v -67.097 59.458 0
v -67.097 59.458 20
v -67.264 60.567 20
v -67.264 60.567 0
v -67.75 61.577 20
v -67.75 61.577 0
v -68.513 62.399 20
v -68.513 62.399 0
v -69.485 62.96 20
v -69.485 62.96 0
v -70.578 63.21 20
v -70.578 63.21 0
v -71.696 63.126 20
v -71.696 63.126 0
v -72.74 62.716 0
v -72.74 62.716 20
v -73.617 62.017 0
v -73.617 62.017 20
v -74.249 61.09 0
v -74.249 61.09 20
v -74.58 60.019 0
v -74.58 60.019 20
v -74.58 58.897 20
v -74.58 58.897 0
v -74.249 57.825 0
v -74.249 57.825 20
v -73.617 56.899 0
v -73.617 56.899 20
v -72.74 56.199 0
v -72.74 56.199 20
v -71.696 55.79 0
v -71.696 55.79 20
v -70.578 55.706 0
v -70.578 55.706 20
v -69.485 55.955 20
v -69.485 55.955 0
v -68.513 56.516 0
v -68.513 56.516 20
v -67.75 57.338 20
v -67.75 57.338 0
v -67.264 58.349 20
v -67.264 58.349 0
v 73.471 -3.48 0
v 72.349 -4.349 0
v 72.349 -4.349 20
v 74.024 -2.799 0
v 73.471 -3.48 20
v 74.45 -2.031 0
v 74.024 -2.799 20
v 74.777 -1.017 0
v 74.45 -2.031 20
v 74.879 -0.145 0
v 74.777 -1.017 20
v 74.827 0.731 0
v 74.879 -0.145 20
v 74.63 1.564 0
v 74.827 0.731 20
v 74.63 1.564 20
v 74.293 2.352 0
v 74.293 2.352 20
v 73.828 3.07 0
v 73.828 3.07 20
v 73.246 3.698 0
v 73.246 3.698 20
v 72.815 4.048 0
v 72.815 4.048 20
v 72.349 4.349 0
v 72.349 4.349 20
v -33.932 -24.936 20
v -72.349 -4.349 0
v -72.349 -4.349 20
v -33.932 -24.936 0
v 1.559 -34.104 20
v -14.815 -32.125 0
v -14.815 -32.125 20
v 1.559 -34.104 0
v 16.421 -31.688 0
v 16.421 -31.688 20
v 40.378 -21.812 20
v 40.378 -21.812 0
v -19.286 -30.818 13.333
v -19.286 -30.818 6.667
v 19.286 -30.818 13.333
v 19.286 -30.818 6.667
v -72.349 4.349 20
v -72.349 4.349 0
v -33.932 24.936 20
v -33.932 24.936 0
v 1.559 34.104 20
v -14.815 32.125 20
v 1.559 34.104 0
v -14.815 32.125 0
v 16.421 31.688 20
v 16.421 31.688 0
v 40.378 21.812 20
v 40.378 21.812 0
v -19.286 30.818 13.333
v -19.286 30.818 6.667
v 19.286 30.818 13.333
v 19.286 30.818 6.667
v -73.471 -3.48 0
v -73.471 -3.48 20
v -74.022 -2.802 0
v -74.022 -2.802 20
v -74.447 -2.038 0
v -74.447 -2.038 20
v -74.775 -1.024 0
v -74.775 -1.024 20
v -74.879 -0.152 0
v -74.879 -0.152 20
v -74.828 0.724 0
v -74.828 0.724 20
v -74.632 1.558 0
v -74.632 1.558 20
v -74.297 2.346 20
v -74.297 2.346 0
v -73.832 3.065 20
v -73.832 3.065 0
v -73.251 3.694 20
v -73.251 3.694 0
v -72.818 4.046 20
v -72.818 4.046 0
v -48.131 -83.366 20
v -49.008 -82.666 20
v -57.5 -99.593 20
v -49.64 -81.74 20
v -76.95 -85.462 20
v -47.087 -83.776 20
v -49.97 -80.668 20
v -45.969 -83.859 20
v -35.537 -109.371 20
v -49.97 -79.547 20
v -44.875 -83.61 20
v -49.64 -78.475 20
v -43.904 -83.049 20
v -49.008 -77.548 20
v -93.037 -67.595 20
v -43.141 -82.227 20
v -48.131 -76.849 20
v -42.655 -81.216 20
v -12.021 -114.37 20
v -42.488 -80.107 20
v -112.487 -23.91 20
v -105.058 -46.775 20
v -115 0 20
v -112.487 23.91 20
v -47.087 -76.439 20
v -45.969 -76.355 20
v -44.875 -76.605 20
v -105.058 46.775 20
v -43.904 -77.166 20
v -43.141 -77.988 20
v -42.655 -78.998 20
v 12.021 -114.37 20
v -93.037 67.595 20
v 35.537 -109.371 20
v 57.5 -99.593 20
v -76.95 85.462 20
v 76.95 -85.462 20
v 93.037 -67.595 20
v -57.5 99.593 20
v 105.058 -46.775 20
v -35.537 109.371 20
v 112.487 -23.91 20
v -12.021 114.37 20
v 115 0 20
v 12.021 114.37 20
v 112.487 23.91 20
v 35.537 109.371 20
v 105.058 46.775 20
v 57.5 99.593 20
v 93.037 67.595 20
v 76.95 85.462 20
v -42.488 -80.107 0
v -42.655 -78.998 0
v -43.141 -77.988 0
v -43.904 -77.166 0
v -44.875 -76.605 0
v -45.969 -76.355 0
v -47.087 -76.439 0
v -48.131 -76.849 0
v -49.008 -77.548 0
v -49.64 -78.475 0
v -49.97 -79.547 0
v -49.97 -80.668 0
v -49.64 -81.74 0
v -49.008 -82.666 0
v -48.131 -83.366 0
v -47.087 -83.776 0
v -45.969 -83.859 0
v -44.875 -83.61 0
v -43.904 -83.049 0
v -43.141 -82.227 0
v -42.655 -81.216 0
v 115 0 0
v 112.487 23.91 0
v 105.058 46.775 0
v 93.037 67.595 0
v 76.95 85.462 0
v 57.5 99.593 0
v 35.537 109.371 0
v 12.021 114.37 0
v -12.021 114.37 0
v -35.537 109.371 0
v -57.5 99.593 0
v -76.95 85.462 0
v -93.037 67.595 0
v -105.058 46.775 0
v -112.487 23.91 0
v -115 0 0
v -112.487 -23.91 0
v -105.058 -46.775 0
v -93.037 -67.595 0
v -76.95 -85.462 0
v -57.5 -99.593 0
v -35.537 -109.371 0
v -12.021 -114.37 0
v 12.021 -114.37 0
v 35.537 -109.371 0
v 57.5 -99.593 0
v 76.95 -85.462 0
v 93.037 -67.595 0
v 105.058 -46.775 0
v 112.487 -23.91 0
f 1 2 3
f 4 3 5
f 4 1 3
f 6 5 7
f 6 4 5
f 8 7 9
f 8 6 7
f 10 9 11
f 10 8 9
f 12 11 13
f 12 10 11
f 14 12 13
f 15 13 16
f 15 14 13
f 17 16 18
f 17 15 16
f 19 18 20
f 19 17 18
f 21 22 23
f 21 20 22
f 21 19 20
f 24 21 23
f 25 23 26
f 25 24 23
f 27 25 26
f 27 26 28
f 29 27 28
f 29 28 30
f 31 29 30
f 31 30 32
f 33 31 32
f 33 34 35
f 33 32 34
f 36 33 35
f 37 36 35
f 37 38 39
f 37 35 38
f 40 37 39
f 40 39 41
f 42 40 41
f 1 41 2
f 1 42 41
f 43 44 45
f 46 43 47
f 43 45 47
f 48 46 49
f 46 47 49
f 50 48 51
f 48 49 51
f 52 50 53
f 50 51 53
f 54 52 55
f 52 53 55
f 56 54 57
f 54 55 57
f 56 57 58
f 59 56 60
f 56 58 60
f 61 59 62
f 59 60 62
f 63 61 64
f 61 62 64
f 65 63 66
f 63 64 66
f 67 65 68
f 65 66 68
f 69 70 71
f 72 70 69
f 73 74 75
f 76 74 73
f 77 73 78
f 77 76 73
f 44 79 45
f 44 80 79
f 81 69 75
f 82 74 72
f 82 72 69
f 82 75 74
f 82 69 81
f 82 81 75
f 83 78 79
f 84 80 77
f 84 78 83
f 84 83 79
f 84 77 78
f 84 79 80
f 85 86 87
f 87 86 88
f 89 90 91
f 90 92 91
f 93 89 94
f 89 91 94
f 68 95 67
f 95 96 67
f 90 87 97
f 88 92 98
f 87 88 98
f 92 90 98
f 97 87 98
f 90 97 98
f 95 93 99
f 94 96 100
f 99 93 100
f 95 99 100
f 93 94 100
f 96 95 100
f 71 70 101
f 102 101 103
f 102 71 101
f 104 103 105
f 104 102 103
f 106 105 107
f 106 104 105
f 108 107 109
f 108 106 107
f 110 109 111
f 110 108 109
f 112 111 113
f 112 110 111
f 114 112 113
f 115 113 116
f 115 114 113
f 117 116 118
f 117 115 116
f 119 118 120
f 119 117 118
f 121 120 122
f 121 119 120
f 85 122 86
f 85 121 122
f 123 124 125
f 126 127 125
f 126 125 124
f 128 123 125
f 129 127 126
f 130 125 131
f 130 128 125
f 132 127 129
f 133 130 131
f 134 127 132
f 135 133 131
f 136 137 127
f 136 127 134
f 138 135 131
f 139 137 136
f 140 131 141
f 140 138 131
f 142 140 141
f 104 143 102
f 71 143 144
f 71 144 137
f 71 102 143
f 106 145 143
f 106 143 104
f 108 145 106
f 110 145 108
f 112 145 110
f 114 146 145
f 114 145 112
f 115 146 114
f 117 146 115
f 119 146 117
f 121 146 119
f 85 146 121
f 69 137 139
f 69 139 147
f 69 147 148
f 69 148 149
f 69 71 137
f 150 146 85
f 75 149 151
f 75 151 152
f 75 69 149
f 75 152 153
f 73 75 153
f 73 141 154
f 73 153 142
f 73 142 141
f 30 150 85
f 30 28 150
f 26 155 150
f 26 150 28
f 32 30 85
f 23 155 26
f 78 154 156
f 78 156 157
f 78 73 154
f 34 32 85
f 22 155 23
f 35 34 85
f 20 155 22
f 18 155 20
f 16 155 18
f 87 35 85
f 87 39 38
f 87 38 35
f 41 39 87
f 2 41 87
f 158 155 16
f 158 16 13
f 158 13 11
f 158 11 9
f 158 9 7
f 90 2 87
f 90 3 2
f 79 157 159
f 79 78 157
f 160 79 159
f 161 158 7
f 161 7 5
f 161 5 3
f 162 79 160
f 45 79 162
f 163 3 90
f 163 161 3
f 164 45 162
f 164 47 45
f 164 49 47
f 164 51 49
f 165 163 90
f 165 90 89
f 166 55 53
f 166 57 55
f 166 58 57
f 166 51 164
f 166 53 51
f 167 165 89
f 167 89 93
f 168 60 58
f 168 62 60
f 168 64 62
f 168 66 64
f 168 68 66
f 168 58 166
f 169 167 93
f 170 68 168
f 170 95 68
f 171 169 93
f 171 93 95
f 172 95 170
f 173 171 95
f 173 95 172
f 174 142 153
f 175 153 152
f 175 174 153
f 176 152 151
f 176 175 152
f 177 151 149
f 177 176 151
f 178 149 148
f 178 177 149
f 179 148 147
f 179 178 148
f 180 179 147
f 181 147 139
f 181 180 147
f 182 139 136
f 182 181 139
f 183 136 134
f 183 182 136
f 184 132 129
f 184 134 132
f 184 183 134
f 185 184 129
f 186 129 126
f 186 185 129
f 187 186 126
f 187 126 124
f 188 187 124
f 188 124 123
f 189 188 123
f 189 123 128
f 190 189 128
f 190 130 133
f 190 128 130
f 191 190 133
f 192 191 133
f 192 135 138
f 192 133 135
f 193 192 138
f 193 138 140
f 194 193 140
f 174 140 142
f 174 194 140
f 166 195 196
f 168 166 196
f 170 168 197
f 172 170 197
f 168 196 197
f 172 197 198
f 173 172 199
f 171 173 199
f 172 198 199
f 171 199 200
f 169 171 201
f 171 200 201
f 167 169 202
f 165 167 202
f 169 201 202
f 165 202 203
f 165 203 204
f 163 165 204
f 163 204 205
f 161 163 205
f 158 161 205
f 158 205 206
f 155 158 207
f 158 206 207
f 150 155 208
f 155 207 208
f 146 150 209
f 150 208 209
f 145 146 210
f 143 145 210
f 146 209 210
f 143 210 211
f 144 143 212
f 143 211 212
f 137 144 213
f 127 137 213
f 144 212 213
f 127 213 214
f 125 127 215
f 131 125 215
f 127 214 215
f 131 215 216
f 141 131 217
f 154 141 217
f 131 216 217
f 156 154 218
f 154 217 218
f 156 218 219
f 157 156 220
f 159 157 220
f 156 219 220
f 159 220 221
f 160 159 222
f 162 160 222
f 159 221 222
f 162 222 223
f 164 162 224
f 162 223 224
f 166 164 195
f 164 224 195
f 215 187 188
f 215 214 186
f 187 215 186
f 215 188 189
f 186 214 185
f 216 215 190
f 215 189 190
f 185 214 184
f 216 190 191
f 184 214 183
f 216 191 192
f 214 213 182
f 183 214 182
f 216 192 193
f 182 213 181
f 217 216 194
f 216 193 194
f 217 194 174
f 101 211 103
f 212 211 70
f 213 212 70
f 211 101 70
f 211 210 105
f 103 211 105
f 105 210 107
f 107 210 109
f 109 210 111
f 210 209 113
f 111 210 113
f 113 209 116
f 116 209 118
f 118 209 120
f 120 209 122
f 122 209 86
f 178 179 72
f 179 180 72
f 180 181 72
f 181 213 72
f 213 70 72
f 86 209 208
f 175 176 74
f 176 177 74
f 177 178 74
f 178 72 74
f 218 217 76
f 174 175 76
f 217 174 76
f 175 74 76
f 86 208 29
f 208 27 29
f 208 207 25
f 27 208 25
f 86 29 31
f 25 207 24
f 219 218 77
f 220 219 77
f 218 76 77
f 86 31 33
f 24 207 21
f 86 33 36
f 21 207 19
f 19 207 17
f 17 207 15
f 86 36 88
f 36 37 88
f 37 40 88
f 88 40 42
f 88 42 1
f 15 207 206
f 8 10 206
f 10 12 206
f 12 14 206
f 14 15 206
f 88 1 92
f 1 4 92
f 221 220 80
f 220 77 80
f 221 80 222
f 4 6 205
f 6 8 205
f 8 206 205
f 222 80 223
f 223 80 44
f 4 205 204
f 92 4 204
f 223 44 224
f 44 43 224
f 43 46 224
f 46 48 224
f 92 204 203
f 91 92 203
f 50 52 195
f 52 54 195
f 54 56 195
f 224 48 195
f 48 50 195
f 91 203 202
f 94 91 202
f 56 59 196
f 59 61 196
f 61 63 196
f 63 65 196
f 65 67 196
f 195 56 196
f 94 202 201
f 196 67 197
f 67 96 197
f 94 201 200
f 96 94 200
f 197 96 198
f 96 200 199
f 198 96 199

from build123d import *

# Parameters (mm, degrees)
F0_R     = 115
F1_DEPTH = 20
F2_R     = 5
F3_R     = 3.7625
F4_DEPTH = 25


with BuildPart() as f1:
    # F0 (on Top) → F1 (new body)
    with BuildSketch(Plane.XY):
        Circle(F0_R)
        with BuildLine():
            add(Edge.make_bspline(
                [(-80, 0), (0, -45.502603054), (0, -45.502603054), (80, 0)],
                knots=[0, 0, 0, 0, 160, 160, 160, 160], degree=3))
            add(Edge.make_bspline(
                [(-80, 0), (0, 45.502603054), (0, 45.502603054), (80, 0)],
                knots=[0, 0, 0, 0, 160, 160, 160, 160], degree=3))
        make_face(mode=Mode.SUBTRACT)
    extrude(amount=F1_DEPTH)

    # F2
    f2_edges = [f1.edges().sort_by_distance(p)[0] for p in [
        (-80, 0, 10),
        (80, 0, 10),
    ]]
    fillet(f2_edges, radius=F2_R)

    # F3 (on Top) → F4 (cut)
    with BuildSketch(Plane.XY):
        with Locations((-70.8591109885, 59.457853896)):
            Circle(F3_R)
        with Locations((-46.25, -80.1073498501)):
            Circle(F3_R)
    extrude(amount=F4_DEPTH, mode=Mode.SUBTRACT)


solid = f1.part
